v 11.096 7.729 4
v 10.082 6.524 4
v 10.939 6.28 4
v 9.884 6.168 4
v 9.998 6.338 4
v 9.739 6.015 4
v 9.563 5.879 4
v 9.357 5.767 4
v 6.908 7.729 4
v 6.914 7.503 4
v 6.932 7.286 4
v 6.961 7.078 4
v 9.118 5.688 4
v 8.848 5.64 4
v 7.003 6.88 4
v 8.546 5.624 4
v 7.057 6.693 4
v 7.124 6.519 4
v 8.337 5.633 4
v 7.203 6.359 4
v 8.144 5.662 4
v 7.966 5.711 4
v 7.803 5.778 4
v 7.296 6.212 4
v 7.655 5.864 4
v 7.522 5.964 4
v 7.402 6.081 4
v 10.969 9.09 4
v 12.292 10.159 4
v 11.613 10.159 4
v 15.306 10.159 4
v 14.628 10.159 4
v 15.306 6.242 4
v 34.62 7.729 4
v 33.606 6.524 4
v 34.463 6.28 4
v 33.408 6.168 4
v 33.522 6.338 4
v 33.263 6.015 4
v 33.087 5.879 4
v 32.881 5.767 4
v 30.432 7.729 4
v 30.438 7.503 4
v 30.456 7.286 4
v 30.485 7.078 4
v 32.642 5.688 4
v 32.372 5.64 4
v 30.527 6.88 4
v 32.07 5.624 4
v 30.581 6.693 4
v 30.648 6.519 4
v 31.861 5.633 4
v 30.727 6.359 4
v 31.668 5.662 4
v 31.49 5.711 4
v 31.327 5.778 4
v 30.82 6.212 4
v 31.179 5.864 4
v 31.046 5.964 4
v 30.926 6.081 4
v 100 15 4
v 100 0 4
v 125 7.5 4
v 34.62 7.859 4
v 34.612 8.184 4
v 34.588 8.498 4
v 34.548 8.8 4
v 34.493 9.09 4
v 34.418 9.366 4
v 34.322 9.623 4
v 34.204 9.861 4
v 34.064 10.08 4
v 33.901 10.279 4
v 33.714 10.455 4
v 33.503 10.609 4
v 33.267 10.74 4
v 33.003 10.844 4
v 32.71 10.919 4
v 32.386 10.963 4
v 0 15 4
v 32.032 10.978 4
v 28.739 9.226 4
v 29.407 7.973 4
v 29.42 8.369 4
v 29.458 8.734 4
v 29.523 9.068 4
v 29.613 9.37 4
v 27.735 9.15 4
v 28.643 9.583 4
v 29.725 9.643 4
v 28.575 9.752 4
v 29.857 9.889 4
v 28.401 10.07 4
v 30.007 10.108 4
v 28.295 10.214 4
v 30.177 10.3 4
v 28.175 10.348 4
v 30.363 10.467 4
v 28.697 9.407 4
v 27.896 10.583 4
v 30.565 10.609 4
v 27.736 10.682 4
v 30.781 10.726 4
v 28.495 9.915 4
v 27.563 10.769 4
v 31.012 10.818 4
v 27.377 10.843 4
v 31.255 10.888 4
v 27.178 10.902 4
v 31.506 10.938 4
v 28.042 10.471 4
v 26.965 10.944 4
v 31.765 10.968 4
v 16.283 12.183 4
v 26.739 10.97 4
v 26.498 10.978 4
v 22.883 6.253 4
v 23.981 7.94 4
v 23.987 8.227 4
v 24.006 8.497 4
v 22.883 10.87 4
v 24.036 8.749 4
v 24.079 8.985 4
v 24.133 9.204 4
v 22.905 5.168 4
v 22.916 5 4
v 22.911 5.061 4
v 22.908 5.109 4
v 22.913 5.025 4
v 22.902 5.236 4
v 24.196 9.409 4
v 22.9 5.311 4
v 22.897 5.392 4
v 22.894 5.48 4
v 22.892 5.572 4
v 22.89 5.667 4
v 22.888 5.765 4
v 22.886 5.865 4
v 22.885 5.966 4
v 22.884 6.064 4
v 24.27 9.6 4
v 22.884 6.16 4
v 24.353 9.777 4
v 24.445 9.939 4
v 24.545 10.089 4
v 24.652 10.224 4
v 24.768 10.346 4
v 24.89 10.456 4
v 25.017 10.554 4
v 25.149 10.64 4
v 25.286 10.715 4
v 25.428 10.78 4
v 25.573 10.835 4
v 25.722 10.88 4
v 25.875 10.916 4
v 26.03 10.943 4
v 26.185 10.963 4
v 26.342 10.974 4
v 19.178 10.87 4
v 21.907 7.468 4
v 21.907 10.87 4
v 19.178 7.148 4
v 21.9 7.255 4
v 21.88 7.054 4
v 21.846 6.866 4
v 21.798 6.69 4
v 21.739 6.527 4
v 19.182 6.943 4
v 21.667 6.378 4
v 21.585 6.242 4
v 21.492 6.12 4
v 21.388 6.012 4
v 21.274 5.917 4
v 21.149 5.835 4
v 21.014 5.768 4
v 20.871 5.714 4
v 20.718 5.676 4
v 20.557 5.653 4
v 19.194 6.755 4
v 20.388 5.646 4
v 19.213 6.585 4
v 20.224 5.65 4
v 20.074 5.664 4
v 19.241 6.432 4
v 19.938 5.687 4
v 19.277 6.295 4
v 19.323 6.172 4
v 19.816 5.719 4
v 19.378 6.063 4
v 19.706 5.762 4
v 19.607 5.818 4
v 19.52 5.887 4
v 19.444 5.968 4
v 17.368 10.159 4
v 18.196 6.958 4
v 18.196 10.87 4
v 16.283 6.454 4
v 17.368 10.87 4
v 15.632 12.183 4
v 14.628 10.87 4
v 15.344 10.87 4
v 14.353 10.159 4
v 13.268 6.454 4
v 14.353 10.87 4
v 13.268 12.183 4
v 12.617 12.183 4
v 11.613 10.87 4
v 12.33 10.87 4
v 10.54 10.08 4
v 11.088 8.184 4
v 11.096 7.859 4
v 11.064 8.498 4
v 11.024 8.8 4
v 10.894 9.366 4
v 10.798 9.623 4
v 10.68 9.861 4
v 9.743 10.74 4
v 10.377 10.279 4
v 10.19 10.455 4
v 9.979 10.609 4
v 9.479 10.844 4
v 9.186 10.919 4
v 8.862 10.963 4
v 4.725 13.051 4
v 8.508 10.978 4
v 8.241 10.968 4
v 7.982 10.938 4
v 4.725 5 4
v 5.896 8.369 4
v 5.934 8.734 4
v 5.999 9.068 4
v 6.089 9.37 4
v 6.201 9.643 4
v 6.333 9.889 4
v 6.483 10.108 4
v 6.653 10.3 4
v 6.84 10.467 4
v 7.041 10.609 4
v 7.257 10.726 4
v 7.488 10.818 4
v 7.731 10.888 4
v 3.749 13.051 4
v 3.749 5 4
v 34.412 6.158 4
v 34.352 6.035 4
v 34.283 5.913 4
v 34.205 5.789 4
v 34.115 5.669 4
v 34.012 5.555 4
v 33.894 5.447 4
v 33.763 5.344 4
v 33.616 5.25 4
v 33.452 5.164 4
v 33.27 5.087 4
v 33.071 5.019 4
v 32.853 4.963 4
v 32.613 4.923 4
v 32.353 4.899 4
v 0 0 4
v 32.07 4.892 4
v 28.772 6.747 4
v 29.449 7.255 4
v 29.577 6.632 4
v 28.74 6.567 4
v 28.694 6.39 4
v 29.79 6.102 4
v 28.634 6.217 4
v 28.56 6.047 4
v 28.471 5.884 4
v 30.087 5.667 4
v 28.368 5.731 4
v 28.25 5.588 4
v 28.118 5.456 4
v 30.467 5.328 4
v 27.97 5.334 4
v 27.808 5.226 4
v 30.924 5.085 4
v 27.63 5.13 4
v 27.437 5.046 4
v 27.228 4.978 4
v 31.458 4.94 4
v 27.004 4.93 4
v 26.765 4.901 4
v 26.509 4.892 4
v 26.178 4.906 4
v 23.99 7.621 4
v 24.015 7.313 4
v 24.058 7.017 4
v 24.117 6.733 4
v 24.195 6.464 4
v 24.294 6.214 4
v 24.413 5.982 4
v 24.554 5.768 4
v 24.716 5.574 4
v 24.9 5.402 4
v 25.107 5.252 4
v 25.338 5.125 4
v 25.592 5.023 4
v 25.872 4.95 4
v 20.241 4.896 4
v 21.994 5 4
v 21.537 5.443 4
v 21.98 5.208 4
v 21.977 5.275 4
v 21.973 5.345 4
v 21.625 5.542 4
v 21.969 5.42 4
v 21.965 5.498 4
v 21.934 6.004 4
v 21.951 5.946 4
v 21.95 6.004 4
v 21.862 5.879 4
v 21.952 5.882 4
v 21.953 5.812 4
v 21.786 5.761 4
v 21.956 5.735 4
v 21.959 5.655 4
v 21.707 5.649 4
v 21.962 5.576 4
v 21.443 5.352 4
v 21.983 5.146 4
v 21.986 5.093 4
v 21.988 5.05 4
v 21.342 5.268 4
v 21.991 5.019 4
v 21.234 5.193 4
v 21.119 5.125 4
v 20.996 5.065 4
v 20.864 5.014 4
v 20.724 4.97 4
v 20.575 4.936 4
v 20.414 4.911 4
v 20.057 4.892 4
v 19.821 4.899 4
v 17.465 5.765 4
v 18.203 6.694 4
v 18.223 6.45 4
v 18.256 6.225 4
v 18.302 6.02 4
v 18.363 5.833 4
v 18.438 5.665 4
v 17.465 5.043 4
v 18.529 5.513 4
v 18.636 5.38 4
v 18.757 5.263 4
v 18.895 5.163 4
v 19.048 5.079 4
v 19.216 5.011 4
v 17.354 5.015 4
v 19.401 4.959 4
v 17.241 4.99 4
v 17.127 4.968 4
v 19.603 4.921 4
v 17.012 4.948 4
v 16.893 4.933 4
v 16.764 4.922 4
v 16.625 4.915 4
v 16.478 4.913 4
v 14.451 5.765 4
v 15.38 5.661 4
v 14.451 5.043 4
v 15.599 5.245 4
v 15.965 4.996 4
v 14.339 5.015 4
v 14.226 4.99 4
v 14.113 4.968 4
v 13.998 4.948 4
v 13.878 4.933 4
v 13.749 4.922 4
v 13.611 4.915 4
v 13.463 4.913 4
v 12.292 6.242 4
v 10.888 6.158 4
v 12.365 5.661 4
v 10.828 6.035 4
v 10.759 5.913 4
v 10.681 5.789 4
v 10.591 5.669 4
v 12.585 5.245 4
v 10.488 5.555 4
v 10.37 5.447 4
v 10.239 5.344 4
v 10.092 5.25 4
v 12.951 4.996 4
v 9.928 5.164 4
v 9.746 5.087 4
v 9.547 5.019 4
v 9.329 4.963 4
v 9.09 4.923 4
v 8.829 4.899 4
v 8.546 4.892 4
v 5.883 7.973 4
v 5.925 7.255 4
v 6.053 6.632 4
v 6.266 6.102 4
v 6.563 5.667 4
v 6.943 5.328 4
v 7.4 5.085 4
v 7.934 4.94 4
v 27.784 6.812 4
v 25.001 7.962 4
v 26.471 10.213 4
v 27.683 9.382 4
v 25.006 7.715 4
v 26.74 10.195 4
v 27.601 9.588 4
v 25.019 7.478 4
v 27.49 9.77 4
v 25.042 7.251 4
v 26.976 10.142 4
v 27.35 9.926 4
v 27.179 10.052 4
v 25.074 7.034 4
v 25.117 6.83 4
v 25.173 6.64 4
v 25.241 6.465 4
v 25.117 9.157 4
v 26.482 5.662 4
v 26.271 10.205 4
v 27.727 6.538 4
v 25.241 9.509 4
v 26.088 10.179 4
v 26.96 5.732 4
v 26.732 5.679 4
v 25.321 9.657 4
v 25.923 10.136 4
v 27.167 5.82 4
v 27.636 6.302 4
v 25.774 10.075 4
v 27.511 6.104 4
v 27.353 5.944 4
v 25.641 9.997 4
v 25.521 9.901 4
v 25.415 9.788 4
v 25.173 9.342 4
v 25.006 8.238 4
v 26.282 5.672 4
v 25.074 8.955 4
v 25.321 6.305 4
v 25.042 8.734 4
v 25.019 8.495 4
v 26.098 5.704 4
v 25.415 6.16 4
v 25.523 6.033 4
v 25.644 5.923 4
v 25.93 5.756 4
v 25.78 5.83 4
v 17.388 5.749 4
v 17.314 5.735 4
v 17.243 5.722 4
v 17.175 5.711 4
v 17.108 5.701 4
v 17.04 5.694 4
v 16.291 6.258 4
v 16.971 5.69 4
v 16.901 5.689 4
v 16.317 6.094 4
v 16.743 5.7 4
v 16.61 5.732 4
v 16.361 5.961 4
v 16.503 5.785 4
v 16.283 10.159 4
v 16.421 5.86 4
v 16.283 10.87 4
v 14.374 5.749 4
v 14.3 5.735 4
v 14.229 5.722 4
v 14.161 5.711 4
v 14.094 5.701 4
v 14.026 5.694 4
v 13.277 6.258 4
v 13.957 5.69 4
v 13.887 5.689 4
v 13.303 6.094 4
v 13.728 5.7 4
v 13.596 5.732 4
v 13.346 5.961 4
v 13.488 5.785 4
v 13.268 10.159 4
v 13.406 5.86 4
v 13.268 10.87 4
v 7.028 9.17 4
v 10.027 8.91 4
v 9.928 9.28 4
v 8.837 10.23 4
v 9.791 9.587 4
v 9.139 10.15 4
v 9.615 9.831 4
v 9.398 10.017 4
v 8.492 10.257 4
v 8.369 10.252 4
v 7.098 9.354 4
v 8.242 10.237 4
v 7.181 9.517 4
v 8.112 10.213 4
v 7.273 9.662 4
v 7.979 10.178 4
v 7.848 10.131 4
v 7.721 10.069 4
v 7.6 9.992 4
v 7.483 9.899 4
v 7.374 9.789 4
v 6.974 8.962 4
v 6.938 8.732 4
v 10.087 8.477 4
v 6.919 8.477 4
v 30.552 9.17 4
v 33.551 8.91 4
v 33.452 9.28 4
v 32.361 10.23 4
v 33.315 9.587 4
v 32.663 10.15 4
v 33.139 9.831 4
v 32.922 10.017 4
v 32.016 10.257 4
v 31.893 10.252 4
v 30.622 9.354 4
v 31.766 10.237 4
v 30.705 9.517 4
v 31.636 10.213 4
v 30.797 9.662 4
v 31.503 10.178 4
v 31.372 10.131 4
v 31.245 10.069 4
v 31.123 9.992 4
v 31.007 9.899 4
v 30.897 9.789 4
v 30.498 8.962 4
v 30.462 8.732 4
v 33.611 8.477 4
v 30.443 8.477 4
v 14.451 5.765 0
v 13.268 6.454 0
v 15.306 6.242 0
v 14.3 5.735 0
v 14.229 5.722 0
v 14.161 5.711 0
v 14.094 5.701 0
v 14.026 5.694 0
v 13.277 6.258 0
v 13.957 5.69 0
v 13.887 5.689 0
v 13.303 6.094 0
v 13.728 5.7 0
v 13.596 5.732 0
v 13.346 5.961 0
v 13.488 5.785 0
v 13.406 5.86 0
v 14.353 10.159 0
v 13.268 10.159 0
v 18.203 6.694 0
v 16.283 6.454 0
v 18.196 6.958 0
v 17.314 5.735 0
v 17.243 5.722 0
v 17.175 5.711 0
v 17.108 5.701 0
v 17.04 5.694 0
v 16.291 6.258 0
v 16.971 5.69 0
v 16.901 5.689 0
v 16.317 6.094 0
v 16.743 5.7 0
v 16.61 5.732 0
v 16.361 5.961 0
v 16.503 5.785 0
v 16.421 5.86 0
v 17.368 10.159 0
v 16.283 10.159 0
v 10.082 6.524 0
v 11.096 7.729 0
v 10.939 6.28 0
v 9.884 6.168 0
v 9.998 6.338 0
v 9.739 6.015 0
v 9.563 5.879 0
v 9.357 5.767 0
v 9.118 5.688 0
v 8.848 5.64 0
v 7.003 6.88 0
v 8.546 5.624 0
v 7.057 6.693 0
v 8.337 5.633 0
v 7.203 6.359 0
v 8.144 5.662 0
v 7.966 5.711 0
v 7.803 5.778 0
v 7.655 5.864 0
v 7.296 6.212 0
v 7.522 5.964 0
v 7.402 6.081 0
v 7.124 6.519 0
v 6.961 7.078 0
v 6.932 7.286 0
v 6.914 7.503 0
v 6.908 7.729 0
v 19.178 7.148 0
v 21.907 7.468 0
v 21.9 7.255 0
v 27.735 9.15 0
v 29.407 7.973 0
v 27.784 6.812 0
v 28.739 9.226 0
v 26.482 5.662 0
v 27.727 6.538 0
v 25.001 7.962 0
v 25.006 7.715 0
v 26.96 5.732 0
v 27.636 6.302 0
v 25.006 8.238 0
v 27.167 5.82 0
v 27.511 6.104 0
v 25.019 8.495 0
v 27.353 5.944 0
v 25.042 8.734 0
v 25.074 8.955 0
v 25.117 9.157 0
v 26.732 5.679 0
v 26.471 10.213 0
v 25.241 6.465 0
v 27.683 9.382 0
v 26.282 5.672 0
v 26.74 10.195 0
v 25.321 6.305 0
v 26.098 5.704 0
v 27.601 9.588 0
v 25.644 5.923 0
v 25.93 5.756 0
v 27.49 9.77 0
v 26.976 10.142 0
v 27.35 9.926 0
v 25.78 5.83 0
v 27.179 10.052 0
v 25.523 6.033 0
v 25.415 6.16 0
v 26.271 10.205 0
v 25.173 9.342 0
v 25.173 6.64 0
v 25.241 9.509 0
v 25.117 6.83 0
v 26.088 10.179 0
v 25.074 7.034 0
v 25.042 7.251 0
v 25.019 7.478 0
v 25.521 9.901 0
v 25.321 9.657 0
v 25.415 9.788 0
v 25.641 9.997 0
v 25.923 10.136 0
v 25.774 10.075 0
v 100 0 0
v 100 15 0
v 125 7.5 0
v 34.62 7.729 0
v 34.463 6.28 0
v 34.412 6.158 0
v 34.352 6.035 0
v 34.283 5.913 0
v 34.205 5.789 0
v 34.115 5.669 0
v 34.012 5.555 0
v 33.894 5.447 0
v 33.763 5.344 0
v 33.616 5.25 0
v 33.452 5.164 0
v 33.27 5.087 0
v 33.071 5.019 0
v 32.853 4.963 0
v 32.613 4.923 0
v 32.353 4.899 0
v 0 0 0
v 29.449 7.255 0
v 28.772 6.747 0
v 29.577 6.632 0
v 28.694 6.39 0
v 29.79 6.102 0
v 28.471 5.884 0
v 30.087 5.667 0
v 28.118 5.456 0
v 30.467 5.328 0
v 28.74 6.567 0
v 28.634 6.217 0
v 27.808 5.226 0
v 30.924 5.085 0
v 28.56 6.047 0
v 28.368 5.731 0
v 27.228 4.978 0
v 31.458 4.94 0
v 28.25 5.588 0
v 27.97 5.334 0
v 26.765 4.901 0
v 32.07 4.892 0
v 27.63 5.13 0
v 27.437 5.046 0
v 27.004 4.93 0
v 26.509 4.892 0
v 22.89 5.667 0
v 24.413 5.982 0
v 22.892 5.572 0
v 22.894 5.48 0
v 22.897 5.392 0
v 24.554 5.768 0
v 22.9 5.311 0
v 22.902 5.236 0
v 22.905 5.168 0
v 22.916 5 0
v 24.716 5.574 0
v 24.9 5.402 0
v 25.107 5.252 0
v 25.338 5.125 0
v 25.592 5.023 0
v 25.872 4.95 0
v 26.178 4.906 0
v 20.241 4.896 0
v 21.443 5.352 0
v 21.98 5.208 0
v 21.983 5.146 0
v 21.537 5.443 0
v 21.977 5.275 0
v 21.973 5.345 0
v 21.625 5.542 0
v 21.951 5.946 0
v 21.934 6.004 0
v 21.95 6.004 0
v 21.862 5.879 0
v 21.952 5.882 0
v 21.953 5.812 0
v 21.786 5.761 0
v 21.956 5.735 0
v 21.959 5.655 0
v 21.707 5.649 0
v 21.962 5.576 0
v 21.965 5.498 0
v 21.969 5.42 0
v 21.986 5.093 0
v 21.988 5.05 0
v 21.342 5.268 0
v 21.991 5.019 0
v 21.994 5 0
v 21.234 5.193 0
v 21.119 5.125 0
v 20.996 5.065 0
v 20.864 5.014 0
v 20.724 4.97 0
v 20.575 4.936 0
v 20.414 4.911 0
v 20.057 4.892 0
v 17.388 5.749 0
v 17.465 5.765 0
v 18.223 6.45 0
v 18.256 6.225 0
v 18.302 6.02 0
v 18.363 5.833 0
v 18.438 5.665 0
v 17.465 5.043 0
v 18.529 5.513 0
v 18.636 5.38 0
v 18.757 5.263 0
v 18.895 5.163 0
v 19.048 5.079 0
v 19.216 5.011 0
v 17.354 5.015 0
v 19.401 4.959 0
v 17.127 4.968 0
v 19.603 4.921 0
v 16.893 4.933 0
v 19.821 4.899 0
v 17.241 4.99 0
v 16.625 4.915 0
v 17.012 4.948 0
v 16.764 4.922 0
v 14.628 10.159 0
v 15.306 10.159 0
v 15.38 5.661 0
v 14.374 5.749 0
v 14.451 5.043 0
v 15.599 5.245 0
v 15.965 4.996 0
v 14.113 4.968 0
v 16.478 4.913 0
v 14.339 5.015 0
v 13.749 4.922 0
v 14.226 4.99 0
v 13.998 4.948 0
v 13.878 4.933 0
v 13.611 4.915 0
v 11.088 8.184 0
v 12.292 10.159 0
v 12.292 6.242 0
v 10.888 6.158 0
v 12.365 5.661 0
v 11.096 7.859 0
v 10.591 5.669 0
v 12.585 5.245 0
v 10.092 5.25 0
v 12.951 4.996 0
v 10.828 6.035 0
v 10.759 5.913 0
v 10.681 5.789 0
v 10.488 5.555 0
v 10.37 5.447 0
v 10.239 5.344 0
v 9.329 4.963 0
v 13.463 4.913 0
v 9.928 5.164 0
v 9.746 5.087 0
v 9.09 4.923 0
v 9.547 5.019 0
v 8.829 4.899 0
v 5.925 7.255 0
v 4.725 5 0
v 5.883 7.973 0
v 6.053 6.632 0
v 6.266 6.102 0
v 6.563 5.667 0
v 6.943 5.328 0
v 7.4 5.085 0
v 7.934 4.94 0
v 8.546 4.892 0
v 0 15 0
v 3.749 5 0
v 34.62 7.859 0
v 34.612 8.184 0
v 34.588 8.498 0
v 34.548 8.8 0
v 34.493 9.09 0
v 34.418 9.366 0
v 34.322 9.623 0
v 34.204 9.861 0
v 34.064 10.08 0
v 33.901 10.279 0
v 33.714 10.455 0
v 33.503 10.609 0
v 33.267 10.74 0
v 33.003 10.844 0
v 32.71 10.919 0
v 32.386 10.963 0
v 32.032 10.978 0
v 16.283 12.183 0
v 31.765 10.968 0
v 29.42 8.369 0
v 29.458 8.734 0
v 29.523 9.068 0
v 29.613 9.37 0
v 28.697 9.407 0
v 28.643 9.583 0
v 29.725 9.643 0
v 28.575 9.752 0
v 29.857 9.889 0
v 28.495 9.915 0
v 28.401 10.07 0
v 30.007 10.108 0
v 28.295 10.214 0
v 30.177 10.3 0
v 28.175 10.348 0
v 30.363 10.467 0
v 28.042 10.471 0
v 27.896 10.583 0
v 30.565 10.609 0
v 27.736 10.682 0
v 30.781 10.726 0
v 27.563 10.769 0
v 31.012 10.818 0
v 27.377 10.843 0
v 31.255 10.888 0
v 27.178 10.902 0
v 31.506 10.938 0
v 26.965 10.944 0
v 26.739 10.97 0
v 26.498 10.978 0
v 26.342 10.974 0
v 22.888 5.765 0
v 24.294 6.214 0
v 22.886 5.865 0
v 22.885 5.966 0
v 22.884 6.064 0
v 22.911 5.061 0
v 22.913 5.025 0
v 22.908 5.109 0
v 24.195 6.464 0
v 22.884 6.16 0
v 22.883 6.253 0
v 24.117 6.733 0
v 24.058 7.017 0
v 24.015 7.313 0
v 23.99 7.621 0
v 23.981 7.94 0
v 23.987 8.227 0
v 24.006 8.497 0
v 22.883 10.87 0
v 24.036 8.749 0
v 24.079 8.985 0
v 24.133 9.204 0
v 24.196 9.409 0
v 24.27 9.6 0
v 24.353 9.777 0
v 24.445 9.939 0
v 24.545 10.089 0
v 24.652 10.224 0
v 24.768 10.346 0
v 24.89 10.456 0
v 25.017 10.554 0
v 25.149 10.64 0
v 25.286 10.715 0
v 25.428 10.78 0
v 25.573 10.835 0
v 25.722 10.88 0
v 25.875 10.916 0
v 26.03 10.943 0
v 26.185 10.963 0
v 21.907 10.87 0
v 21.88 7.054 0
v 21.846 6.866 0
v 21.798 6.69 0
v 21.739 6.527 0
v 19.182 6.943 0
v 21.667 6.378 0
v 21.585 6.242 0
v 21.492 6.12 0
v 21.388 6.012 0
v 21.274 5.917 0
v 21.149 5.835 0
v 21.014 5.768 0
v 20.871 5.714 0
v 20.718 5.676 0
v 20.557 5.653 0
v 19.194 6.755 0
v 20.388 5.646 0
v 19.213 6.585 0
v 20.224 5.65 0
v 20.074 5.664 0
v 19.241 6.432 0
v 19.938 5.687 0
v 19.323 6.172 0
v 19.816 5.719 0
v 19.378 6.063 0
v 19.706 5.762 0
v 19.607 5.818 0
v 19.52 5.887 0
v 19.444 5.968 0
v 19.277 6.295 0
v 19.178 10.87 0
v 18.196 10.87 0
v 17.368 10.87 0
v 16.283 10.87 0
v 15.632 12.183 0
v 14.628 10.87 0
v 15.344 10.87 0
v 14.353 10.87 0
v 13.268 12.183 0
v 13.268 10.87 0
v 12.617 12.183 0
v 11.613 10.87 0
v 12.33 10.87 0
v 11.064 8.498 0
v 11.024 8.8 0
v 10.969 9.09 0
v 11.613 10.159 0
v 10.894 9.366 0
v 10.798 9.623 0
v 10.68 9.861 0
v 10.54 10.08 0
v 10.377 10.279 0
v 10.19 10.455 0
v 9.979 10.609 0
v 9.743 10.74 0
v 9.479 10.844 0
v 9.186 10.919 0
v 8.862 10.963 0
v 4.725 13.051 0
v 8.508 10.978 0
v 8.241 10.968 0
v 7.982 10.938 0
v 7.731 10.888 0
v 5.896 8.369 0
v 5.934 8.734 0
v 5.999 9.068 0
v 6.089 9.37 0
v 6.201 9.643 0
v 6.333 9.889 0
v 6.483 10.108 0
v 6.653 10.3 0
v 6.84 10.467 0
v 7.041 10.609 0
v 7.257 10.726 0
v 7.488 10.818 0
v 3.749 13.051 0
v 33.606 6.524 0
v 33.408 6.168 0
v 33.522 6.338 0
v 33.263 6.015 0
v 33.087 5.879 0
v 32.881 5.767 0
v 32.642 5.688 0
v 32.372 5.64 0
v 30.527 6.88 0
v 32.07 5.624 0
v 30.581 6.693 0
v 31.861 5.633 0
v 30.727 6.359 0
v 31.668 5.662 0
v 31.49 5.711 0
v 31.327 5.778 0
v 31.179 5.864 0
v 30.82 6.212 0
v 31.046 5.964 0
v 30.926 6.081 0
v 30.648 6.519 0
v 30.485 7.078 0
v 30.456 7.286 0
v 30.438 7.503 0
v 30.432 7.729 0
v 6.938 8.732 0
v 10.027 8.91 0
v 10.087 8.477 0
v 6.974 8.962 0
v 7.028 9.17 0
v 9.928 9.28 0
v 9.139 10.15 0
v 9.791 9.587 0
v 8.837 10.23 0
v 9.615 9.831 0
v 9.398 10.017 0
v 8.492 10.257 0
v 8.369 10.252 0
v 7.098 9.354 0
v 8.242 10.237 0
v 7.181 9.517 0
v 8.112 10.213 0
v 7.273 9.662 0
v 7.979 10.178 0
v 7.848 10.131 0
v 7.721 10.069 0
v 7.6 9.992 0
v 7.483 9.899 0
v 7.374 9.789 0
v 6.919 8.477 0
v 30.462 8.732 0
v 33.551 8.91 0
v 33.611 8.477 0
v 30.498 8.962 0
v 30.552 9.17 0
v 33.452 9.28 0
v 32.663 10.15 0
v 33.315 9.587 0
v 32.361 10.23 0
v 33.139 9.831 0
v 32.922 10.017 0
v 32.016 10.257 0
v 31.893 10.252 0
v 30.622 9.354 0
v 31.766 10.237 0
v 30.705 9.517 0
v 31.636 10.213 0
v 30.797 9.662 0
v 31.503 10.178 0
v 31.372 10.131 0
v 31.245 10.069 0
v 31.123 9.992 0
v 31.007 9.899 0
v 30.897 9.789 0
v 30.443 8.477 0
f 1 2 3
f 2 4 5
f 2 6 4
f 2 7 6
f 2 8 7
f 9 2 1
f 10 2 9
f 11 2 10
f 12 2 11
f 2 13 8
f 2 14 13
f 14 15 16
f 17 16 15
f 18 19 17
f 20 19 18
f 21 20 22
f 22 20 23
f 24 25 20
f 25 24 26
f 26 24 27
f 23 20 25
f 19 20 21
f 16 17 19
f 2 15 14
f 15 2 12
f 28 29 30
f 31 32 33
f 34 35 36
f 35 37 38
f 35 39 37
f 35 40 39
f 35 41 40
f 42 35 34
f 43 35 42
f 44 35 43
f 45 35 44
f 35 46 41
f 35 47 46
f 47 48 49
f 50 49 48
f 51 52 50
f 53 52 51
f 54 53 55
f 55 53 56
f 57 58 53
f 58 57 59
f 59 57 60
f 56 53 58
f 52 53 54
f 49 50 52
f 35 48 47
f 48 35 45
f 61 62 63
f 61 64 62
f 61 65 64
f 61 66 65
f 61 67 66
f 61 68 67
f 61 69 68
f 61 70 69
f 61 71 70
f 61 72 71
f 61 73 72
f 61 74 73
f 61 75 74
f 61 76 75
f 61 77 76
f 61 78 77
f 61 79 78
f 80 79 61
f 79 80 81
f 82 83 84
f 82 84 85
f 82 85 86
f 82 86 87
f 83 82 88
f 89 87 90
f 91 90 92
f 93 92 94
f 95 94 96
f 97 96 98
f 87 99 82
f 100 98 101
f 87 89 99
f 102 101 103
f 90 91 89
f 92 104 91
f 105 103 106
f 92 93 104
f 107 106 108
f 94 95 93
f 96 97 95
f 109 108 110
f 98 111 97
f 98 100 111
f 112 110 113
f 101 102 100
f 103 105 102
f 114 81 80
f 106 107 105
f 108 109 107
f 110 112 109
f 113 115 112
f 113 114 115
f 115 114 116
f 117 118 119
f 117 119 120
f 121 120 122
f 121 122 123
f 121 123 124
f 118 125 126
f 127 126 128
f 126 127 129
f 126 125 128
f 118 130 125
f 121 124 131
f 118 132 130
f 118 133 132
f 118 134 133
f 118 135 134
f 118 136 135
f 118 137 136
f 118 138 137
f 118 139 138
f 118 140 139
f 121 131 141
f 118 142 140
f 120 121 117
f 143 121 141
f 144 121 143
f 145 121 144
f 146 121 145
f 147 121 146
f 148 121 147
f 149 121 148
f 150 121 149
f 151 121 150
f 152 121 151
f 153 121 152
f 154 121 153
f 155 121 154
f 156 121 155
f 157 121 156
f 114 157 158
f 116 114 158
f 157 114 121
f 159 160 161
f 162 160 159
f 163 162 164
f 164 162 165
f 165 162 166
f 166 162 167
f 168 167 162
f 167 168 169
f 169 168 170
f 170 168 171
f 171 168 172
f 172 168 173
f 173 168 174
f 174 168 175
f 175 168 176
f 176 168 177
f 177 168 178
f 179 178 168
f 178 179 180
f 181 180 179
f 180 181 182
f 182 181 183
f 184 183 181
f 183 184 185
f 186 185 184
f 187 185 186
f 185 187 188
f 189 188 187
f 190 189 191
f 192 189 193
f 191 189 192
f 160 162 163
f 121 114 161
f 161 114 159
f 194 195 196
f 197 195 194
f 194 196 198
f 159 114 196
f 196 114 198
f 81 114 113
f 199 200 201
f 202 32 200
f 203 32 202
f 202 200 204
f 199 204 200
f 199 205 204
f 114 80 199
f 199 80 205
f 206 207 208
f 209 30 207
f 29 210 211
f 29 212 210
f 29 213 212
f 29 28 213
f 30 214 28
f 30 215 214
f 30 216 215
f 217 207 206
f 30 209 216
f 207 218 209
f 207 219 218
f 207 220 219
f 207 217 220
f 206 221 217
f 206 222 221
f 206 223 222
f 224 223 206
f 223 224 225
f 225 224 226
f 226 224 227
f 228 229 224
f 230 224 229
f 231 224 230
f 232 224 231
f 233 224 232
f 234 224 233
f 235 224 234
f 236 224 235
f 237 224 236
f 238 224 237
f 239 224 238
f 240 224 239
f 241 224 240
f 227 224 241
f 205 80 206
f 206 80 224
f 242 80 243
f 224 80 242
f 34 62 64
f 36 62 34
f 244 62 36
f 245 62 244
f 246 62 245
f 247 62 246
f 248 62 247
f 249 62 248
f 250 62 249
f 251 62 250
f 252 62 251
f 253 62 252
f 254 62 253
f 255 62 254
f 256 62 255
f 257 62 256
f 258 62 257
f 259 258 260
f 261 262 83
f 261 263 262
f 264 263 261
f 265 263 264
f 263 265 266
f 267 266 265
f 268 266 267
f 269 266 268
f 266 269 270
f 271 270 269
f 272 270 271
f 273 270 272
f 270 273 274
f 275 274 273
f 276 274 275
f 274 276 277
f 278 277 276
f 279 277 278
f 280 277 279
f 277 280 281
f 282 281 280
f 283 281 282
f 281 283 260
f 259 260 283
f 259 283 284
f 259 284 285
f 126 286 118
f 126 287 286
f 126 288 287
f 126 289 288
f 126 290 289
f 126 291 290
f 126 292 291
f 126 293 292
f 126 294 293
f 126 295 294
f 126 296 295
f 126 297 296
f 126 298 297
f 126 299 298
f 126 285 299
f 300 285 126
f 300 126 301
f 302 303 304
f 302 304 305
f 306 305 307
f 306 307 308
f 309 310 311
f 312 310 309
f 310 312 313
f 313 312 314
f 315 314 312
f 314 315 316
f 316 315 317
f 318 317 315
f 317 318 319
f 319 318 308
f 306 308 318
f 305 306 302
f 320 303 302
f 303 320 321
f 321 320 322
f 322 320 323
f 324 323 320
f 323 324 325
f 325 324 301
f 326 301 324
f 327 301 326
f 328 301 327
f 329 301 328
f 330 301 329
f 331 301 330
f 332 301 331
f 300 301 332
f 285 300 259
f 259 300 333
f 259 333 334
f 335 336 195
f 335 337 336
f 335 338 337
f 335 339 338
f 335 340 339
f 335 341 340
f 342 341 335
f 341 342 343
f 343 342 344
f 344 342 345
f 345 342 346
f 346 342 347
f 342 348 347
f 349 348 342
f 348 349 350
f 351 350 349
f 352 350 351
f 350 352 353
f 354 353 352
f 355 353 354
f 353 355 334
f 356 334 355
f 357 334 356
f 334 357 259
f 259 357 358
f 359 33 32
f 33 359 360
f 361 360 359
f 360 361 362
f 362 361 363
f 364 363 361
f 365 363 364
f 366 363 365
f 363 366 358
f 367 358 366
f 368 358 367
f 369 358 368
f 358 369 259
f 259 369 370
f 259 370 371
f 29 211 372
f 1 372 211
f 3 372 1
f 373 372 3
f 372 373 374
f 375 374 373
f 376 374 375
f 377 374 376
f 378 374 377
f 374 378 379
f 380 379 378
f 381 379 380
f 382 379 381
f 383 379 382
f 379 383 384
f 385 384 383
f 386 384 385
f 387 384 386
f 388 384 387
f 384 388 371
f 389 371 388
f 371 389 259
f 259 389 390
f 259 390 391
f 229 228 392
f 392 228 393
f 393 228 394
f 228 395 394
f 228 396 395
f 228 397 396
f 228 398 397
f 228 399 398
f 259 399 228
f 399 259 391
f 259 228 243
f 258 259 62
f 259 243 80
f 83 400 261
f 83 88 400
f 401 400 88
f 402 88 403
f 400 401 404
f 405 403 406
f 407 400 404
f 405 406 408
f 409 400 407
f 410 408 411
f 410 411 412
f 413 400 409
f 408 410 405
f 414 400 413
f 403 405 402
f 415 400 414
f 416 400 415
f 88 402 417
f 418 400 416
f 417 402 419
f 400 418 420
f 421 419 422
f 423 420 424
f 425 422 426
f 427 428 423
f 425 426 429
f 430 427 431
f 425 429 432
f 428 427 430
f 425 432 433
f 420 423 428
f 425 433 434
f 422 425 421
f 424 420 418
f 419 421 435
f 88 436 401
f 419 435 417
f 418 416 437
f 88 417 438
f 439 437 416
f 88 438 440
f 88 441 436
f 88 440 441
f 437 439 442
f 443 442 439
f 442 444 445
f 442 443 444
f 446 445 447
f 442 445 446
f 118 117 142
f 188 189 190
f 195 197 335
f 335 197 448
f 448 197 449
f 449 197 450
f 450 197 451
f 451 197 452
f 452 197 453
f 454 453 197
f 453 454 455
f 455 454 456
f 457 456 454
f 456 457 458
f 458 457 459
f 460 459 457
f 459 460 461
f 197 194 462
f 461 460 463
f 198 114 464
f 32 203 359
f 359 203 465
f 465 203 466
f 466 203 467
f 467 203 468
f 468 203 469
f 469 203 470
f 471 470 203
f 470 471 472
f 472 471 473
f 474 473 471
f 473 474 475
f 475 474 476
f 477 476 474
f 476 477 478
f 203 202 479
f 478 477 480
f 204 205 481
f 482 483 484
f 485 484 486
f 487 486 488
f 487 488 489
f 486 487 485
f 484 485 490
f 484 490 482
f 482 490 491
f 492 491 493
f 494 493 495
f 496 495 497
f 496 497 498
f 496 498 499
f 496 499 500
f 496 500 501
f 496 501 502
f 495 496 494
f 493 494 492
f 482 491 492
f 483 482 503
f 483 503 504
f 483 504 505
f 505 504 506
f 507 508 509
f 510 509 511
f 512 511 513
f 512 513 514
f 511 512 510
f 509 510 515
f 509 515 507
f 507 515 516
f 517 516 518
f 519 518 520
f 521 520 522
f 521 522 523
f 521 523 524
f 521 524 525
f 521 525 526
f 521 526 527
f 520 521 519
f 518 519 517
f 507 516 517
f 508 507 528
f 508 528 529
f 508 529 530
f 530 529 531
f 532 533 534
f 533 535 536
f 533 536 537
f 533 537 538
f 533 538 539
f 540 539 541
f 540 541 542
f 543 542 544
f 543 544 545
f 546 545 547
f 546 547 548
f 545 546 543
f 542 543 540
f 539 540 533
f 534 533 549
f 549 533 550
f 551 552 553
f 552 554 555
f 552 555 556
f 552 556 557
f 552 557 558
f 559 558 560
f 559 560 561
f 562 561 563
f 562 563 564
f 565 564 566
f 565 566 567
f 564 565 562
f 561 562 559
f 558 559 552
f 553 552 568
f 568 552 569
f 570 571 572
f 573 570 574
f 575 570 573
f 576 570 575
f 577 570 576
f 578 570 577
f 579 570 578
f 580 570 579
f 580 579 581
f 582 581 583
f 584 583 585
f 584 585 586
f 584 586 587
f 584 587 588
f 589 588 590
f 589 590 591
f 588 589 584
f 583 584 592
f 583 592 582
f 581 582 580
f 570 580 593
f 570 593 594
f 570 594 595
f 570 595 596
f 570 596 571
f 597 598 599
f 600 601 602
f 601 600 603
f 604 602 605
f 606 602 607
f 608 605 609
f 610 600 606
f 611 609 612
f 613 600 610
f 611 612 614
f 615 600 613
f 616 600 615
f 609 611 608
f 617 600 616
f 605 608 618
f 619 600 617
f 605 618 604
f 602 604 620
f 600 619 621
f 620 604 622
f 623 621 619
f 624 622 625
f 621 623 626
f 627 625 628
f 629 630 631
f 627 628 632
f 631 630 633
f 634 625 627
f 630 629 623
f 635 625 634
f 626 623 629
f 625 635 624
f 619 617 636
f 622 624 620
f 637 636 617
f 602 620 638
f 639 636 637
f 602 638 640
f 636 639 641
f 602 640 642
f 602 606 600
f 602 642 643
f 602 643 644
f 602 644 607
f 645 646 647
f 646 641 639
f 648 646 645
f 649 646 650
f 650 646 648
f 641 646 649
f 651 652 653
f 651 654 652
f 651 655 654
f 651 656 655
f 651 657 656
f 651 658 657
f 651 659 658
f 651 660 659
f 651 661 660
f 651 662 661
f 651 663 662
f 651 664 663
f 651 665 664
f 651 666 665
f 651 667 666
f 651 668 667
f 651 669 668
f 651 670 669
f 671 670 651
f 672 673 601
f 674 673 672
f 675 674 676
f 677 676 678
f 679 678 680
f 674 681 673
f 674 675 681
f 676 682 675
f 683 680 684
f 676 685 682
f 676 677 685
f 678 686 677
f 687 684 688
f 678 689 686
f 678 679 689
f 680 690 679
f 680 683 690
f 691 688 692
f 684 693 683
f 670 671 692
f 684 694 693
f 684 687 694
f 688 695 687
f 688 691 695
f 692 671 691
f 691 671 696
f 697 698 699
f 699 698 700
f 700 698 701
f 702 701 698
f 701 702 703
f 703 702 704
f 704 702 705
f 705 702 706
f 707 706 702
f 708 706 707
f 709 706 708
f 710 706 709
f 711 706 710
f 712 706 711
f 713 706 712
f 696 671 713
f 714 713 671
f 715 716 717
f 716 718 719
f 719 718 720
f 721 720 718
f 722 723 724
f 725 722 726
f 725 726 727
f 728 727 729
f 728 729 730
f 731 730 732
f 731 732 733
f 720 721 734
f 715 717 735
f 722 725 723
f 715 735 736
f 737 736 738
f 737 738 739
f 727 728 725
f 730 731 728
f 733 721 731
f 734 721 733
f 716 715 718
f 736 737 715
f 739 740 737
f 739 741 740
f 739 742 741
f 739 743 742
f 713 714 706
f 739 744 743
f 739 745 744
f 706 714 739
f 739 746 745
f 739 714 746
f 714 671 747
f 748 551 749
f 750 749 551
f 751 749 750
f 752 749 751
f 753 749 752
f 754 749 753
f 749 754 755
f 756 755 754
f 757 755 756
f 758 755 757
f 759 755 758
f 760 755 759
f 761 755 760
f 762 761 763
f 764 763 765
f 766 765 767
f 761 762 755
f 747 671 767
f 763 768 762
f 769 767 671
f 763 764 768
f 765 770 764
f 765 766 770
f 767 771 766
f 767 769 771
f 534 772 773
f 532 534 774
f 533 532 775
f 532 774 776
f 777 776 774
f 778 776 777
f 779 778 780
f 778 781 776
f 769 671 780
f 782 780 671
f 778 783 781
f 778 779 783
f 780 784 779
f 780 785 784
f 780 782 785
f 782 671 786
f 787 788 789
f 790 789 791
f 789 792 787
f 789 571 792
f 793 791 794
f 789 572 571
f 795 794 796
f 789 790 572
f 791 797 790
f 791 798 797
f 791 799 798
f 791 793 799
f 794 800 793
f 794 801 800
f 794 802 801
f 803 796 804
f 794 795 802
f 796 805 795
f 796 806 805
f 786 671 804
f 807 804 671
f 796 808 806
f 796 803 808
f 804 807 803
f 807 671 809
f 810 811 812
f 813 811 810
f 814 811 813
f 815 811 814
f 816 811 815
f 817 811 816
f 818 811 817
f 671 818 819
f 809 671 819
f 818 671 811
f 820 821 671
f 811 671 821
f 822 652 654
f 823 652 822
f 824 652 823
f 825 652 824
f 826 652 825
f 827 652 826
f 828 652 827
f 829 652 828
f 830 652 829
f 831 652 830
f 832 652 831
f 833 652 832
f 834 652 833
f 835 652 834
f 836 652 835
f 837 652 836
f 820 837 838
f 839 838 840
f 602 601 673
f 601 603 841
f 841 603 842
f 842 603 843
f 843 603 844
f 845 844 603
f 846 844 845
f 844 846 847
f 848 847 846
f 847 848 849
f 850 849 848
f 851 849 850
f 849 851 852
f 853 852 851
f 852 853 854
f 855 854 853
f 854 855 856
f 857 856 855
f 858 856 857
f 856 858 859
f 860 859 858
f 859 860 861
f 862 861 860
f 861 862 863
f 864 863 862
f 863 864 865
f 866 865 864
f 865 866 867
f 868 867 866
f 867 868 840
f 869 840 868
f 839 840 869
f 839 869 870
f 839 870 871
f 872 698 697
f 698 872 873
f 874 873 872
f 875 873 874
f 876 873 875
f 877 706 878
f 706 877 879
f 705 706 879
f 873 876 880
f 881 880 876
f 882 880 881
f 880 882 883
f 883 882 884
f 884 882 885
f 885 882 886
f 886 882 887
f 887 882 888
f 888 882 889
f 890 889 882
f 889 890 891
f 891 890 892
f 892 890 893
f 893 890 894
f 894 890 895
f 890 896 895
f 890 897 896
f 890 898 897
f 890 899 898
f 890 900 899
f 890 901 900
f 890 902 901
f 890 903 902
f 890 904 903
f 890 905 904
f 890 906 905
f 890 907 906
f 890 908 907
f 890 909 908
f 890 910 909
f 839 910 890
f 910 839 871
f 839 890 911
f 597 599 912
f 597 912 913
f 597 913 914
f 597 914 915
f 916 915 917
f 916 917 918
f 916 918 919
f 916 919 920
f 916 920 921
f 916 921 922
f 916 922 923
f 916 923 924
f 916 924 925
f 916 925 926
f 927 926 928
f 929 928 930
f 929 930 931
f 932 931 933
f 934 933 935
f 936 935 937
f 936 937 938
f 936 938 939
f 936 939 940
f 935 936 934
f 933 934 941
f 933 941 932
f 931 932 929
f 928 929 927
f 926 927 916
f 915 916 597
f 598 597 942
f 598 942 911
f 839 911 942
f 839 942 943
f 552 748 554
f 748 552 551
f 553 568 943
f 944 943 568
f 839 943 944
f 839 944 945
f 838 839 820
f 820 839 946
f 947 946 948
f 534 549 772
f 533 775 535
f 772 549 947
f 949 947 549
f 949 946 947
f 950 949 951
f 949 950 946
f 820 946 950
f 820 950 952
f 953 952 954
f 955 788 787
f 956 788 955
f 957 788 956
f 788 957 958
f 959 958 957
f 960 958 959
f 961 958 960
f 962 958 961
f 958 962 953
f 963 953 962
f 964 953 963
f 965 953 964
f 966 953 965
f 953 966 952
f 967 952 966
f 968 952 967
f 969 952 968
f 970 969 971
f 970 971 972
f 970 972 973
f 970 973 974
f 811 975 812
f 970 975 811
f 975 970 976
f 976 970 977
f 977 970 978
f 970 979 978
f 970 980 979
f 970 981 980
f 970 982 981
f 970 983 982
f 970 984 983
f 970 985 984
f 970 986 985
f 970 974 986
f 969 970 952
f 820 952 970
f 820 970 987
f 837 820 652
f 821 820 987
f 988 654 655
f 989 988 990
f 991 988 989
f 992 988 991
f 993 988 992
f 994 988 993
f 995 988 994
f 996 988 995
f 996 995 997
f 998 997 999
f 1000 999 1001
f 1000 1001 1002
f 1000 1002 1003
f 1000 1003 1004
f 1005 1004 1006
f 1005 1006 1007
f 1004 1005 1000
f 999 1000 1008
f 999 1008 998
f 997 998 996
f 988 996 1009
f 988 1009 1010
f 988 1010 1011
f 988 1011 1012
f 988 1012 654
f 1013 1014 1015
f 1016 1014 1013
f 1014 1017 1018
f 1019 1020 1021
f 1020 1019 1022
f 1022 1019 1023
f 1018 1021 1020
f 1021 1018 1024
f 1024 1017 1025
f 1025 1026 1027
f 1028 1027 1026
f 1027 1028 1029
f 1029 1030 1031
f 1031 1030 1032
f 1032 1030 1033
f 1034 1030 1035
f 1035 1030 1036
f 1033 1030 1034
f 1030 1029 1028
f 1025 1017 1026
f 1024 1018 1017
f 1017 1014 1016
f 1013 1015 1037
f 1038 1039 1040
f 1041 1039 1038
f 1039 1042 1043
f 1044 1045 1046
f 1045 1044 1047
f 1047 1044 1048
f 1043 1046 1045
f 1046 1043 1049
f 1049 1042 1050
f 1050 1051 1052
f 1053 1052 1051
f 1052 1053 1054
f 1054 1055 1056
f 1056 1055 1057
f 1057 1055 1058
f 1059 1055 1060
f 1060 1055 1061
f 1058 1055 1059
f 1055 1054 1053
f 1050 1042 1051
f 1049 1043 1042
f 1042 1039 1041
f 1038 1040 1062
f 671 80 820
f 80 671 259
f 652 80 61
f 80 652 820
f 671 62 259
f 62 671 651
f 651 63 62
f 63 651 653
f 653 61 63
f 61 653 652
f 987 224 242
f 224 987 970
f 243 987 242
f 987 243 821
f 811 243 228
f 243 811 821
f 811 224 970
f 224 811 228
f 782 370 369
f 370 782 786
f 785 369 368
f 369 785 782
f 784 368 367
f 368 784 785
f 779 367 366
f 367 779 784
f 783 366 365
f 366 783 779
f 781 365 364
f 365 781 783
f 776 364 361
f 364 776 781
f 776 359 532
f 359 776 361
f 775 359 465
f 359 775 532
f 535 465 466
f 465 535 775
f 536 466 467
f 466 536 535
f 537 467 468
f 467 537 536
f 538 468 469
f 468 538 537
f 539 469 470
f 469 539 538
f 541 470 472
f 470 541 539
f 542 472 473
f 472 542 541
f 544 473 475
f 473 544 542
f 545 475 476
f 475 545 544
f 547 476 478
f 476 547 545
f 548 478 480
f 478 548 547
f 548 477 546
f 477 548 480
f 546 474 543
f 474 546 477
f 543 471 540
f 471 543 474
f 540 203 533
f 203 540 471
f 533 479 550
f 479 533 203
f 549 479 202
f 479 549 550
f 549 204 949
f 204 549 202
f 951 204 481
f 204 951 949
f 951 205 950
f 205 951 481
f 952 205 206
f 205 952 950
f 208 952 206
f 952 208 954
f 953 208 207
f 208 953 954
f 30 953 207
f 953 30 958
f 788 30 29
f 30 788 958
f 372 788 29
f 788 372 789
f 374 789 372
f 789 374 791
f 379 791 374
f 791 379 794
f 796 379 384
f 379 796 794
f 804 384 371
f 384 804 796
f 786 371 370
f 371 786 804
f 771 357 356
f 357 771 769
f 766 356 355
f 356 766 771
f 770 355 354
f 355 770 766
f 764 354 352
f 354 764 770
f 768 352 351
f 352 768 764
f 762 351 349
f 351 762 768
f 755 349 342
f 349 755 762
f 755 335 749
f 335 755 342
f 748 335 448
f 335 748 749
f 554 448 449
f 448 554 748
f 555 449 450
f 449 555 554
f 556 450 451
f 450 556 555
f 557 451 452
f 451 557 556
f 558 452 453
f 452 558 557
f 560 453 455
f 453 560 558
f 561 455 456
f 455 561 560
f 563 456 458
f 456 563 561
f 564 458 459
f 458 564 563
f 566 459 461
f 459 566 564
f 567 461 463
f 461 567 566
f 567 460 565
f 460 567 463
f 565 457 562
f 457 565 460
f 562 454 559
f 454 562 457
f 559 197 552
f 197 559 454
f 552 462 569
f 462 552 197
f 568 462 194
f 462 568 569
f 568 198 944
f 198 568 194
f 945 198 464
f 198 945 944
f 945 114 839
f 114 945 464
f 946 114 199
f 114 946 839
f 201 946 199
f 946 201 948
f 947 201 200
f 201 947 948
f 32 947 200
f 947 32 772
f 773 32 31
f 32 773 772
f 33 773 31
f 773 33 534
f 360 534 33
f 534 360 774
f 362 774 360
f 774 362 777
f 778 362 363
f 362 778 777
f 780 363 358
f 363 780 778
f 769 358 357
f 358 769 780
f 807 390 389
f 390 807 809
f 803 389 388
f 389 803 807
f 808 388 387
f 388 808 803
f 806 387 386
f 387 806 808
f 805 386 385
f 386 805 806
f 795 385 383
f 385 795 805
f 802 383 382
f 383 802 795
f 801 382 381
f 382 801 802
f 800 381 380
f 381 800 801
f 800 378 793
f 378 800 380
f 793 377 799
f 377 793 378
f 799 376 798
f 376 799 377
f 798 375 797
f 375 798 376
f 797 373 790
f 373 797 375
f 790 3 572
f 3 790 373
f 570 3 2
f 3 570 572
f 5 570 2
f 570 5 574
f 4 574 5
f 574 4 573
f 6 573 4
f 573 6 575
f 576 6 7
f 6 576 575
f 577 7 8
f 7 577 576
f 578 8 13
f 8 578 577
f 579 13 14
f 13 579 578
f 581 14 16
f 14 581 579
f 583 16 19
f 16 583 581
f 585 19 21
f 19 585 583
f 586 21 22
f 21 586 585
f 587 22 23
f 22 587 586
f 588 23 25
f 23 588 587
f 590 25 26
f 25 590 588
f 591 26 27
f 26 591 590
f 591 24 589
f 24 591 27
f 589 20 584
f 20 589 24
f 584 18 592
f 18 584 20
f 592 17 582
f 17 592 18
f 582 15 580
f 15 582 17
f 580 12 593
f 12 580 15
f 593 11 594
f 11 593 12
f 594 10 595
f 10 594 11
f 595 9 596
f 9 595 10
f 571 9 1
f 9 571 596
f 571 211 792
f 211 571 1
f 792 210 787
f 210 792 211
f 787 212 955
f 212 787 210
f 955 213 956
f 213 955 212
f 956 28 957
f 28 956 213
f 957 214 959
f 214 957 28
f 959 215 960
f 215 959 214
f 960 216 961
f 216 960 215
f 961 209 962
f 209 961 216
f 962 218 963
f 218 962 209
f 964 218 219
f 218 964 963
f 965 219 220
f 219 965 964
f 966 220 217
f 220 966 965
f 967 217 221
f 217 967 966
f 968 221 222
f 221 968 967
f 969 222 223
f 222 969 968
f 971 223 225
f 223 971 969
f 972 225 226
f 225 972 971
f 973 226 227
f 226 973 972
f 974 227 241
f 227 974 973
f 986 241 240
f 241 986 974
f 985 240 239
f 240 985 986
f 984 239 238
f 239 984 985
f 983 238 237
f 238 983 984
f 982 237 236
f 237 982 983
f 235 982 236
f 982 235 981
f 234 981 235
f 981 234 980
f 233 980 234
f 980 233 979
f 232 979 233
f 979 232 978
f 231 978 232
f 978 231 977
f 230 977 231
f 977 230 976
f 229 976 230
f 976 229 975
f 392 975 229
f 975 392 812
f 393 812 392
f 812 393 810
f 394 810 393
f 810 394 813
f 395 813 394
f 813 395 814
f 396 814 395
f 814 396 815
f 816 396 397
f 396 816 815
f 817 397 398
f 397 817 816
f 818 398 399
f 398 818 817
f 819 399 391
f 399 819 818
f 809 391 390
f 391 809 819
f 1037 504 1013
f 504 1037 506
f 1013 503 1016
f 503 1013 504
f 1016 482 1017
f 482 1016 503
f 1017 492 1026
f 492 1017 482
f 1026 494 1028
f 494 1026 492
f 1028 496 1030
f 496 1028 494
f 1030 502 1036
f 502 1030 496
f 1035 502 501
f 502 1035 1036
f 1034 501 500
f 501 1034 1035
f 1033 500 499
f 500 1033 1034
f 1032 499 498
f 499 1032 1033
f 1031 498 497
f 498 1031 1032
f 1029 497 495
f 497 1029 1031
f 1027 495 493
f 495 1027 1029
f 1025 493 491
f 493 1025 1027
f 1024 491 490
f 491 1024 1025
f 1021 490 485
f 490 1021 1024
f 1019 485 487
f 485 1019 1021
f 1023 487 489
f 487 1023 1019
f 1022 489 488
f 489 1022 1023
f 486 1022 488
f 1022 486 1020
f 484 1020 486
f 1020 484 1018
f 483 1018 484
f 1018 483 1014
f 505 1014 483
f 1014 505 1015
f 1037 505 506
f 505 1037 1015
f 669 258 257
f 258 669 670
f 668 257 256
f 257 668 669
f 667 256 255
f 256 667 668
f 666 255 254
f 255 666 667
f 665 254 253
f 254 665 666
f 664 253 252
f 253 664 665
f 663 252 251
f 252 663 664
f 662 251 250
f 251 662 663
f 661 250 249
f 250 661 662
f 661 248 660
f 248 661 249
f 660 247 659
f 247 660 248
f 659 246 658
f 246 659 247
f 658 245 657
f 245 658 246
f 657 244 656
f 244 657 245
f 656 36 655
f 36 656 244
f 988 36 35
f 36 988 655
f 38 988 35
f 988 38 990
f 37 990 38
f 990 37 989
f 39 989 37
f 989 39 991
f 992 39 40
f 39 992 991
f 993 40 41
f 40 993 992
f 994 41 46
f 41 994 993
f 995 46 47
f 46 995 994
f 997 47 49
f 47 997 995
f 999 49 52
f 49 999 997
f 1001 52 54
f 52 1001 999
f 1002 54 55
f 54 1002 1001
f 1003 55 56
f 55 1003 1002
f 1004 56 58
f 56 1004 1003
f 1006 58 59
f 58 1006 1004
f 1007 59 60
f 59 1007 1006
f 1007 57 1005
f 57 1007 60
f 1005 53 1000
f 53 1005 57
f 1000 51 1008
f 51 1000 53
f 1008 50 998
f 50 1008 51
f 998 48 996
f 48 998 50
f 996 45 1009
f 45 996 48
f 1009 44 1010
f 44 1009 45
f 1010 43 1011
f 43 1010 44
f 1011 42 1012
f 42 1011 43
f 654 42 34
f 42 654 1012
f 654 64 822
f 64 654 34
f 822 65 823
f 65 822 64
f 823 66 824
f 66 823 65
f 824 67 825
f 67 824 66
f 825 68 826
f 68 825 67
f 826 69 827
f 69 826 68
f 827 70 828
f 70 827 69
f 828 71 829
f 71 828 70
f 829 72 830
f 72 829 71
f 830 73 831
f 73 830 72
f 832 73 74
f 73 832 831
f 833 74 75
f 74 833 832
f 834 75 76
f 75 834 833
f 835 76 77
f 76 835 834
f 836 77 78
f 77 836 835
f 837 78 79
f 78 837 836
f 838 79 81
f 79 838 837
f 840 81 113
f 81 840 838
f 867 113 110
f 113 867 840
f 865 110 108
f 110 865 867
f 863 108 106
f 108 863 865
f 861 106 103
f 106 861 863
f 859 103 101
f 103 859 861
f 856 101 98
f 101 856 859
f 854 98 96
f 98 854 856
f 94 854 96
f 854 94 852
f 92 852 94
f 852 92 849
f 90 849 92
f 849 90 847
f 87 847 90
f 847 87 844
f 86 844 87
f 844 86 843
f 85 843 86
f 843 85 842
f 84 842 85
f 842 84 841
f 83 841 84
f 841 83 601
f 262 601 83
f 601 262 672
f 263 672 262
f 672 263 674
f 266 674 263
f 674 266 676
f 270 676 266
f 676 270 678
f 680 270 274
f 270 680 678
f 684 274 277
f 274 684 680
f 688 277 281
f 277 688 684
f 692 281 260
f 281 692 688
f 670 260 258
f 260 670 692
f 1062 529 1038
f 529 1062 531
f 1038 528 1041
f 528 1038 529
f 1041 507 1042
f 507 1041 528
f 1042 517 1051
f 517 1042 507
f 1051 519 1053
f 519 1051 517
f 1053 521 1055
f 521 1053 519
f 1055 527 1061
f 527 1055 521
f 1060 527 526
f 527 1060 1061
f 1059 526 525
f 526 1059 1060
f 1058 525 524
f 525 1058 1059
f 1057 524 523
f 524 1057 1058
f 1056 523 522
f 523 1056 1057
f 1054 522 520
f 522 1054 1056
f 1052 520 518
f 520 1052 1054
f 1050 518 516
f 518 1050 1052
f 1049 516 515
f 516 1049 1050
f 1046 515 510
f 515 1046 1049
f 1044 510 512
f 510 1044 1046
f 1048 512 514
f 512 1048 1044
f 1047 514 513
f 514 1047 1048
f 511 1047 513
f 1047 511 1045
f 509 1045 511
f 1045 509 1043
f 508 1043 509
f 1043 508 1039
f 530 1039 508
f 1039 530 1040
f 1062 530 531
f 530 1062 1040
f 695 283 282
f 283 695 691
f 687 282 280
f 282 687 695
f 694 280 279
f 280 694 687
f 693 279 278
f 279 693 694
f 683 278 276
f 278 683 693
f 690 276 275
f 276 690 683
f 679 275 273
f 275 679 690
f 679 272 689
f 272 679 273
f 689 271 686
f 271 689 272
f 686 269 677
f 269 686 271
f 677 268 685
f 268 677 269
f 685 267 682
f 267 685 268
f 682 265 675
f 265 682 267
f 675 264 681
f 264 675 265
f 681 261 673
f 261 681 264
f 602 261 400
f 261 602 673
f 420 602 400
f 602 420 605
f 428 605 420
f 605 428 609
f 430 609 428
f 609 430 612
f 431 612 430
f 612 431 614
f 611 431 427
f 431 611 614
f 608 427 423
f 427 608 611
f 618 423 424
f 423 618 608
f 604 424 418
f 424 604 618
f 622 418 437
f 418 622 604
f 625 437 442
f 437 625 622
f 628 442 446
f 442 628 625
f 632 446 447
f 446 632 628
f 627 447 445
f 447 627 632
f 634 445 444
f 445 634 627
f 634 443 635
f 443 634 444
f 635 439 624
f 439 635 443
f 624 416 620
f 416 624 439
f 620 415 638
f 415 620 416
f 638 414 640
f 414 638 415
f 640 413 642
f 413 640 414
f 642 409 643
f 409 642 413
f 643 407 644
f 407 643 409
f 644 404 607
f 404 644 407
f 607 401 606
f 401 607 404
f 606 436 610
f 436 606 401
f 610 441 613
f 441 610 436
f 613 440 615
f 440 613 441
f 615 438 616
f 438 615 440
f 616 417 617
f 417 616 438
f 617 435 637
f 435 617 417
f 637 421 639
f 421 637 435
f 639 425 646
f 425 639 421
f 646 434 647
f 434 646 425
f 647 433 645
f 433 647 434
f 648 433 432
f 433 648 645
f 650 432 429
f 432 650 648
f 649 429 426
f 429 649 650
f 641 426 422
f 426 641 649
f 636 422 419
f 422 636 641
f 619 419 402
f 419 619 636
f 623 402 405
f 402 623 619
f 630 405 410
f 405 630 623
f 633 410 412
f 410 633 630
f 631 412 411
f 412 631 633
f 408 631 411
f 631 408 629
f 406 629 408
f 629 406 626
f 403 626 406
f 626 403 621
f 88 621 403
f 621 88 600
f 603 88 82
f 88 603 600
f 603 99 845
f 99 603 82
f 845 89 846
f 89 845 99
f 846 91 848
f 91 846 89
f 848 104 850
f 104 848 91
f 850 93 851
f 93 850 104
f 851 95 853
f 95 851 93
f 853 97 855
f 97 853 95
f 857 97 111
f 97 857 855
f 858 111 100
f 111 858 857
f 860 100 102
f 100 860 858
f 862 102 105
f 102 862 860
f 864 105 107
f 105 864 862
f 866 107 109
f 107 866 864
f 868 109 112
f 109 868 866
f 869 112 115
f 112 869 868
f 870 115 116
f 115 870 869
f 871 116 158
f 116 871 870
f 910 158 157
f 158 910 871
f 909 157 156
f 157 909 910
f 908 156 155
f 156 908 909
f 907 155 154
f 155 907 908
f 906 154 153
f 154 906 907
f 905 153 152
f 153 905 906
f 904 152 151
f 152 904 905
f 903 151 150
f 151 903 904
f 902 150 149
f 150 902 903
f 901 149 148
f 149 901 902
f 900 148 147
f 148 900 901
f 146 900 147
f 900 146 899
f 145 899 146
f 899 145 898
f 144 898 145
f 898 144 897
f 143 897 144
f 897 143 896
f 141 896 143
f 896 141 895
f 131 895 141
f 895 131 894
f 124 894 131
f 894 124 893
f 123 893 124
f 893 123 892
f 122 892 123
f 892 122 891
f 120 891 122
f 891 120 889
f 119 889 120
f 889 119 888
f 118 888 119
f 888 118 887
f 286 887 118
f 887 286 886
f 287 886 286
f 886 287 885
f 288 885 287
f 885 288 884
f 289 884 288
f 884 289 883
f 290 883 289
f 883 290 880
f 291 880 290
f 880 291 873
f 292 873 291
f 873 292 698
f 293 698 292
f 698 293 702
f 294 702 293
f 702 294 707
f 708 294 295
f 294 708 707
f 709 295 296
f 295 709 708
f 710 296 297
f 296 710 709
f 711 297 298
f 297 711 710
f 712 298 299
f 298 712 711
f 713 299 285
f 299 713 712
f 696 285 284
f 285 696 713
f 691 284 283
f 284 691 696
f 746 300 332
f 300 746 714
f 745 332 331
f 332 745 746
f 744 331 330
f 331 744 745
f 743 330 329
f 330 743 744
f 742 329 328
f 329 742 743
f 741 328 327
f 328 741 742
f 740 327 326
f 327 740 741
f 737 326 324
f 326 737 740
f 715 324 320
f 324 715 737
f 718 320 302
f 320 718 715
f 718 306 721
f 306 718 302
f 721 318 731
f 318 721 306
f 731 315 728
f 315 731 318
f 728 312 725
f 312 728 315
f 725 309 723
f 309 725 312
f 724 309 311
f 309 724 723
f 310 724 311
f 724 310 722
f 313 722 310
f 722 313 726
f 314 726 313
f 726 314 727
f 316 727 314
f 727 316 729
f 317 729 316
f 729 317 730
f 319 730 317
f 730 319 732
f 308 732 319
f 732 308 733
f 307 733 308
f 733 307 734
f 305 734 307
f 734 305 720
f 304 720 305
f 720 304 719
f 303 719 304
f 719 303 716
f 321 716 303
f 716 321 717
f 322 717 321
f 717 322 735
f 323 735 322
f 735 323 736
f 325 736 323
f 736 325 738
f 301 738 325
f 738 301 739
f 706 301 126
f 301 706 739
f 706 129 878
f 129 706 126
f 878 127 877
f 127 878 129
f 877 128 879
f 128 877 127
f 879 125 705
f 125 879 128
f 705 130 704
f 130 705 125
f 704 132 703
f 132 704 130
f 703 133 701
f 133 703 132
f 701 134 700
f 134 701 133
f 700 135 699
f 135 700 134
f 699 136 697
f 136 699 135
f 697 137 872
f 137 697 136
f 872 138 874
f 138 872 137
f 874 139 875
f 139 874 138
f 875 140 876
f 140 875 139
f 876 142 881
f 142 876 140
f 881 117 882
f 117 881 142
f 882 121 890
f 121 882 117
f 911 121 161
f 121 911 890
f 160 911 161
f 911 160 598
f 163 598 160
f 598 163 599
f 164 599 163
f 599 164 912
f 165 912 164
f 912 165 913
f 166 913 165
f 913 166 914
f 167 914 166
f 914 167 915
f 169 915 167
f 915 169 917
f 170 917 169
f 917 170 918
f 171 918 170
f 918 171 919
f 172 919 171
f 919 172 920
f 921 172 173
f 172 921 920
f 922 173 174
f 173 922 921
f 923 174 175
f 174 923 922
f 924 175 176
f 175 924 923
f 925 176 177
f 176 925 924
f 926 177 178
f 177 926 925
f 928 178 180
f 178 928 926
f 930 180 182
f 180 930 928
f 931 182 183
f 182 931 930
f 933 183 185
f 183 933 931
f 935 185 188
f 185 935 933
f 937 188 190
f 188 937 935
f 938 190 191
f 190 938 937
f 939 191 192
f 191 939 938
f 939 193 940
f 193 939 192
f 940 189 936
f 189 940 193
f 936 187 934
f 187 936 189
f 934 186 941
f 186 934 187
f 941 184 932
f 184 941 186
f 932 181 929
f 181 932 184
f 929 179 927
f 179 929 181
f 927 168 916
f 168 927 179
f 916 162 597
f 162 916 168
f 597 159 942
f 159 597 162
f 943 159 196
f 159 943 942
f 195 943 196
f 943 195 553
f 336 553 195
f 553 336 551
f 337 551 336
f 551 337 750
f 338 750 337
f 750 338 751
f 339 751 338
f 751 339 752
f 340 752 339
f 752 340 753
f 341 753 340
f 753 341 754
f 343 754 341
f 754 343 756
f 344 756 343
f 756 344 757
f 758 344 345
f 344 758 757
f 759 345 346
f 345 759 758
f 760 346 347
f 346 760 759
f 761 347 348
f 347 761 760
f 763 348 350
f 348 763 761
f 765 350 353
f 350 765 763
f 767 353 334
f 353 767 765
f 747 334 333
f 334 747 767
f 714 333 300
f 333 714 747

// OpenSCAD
//reference"
//import("/tmp/Plant_Marker_-_Mint.stl");

// rect -100 to +50
// 50 mm triangle
//25 mm wide
// 5mm high

label = "lettuce";

L = 100.0; //150
PL = 25.0; //50
W = 15.0; //25
H = 4.0;

difference() {    
    union() {
        cube([L,W,H]);
        translate([L,0,0])
            linear_extrude(H)
                polygon(points=[
                    [0, 0],
                    [PL, (W / 2)], //50, 12.5
                    [0, W]
                    ]);
        /*
            polyhedron(points=[
                [0, 0, 0],
                [50, 12.5, 0], //50, 12.5
                [0, 25, 0],
                [0, 0, 5],
                [50, 12.5, 5], //50, 12.5
                [0, 25, 5]

        ], faces=[
                
                [0,3,5,2, 0], //back
                [0,3,4,1], //side
                [2,5,4,1],  //side
                [0, 1, 2, 0], // top
                [3, 4, 5, 3], // bottom
                
                //[1,4,7,6,1], //front
                
                //The points need to be listed clockwise when viewed from outside the polyhedron.
                // NOTE: These points are drawn in order like an outline!
                
                
        ]);
        */
    }
 
    translate([3, (W/3), -1]) {
        linear_extrude(H+2)
               text(label,size=8);
    }
}
